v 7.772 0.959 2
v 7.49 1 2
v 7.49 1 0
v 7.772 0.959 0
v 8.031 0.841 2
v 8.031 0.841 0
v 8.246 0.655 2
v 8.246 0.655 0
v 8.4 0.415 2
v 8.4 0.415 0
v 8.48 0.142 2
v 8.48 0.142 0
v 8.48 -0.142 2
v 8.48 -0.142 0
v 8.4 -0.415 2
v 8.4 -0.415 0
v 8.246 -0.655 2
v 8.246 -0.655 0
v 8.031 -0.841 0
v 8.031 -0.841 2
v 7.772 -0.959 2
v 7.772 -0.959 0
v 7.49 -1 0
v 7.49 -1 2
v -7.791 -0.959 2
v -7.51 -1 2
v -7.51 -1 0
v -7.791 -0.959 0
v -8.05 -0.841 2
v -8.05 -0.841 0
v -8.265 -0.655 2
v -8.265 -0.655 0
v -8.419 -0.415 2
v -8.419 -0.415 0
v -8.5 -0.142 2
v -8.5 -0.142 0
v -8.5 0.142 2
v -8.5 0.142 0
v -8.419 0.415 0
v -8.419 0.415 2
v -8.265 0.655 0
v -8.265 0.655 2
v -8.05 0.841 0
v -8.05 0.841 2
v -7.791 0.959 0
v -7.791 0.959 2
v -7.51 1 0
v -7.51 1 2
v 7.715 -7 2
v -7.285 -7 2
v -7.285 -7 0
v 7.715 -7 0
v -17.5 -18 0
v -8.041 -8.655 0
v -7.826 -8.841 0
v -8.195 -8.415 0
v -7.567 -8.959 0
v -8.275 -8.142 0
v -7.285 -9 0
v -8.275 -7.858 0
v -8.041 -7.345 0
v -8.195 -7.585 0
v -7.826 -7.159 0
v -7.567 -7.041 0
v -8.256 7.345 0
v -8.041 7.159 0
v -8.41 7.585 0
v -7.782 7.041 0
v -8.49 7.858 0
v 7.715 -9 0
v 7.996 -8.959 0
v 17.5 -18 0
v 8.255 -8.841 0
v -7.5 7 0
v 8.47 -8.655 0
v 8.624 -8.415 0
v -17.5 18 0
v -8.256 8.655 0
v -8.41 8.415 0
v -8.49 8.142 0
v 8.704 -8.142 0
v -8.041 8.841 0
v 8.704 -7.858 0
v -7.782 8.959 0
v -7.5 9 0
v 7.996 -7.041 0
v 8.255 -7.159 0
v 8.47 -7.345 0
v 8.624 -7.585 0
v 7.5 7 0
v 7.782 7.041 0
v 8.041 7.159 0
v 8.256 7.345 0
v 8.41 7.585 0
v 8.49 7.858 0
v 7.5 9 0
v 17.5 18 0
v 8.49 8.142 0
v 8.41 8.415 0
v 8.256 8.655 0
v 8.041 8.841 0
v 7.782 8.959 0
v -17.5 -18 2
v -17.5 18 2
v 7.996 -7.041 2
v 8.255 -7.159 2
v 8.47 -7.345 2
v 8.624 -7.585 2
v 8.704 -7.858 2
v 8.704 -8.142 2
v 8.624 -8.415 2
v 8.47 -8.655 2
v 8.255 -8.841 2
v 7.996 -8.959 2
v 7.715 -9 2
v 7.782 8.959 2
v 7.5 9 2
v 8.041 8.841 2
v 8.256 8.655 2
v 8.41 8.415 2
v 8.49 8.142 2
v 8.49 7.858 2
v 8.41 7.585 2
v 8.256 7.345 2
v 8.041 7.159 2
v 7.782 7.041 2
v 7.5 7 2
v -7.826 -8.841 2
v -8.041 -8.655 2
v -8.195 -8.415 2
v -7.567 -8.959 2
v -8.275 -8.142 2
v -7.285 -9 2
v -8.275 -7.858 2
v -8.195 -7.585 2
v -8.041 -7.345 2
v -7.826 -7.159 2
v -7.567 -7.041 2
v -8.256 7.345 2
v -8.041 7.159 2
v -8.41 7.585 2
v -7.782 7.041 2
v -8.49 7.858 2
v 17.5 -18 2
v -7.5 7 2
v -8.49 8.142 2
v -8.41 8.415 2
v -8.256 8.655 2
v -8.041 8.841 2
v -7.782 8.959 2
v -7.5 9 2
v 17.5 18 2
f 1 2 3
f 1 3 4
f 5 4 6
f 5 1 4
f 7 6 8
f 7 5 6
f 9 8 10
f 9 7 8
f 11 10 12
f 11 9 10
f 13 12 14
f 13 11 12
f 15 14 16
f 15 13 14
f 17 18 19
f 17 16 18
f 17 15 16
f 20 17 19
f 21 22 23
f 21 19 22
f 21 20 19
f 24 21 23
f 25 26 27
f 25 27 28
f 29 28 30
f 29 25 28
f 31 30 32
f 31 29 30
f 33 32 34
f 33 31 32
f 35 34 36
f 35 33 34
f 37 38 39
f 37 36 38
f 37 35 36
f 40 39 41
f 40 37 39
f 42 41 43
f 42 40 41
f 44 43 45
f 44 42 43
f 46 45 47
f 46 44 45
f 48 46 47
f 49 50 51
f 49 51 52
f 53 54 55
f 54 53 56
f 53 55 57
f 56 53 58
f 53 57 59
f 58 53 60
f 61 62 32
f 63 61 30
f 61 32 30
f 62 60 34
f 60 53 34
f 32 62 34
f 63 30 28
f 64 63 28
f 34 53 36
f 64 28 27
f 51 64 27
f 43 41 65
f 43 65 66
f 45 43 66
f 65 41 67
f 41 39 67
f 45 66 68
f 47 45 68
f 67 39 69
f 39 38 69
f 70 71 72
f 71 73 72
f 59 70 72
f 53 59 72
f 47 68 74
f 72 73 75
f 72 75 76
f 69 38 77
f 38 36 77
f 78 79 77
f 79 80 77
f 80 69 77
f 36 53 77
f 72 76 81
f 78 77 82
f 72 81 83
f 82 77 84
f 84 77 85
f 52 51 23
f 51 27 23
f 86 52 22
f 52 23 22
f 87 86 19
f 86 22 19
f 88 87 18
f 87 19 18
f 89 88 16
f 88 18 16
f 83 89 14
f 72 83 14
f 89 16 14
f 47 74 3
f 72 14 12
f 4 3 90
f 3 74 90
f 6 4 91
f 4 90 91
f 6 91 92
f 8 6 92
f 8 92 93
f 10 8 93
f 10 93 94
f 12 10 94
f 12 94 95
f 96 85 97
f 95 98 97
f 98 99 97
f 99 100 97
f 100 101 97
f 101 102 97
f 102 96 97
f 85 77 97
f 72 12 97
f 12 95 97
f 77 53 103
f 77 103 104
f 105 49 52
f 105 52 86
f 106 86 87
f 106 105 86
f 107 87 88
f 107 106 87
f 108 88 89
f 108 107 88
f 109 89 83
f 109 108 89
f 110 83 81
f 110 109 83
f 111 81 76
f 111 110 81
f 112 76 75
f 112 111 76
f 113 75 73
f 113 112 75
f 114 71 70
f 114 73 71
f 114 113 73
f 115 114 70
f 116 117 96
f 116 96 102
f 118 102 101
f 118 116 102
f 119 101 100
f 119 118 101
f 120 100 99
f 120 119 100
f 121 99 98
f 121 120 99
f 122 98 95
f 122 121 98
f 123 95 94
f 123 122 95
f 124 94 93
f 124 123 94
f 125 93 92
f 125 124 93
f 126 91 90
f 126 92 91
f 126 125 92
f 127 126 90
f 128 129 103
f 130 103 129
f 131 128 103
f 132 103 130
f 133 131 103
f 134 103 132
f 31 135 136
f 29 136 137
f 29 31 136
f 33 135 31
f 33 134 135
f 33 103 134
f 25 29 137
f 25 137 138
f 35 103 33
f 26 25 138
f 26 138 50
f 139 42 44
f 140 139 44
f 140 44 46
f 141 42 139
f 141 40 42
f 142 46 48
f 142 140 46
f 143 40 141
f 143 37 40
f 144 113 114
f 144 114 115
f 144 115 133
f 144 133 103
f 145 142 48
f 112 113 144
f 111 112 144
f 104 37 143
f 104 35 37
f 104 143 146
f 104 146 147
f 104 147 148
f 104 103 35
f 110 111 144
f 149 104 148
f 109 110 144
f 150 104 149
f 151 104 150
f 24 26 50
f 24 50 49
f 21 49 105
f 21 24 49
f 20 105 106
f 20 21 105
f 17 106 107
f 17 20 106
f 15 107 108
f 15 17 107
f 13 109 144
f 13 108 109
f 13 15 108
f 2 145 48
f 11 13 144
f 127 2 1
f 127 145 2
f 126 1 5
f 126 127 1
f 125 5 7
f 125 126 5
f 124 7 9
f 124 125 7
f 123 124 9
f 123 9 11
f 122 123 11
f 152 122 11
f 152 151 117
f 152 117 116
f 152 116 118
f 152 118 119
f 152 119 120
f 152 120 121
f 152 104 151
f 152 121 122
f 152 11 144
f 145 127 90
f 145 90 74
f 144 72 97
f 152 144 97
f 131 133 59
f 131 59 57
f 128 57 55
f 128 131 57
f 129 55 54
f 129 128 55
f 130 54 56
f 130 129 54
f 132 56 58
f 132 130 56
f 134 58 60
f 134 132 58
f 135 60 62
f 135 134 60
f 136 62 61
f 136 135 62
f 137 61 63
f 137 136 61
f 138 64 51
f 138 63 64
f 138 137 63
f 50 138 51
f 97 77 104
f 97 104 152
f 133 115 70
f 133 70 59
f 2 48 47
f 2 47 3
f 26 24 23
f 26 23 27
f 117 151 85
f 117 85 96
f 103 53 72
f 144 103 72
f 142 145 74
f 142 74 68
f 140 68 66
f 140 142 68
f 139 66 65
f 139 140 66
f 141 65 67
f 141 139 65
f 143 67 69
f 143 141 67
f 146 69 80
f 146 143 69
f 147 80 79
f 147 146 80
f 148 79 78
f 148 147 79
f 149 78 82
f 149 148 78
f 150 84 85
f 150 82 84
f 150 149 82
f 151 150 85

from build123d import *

# Parameters (mm, degrees)
SKETCH_1_W          = 35
SKETCH_1_H          = 36
EXTRUDE_1_DEPTH     = 2
CUT_EXTRUDE_1_REACH = 27.184


with BuildPart() as part:
    # 草图1 → 凸台-拉伸1 (new body)
    with BuildSketch(Plane.XY):
        Rectangle(SKETCH_1_W, SKETCH_1_H)
    extrude(amount=EXTRUDE_1_DEPTH)

    # 草图2 → 切除-拉伸1 (cut, up to next)
    with BuildSketch(Plane.XY.offset(2), mode=Mode.PRIVATE) as cut_extrude_1_sk1:
        with BuildLine():
            Line((-7.5, 9), (7.5, 9))
            ThreePointArc((7.5, 9), (8.5, 8), (7.5, 7))
            Line((7.5, 7), (-7.5, 7))
            ThreePointArc((-7.5, 7), (-8.5, 8), (-7.5, 9))
        make_face()
    cut_extrude_1_tool1 = extrude(cut_extrude_1_sk1.sketch, amount=-CUT_EXTRUDE_1_REACH, mode=Mode.PRIVATE) & part.part
    # 草图2 → 切除-拉伸1 (cut, up to next)
    with BuildSketch(Plane.XY.offset(2), mode=Mode.PRIVATE) as cut_extrude_1_sk2:
        with BuildLine():
            Line((-7.509739979, 1), (7.490260021, 1))
            ThreePointArc((7.490260021, 1), (8.490260021, 0), (7.490260021, -1))
            Line((7.490260021, -1), (-7.509739979, -1))
            ThreePointArc((-7.509739979, -1), (-8.509739979, 0), (-7.509739979, 1))
        make_face()
    cut_extrude_1_tool2 = extrude(cut_extrude_1_sk2.sketch, amount=-CUT_EXTRUDE_1_REACH, mode=Mode.PRIVATE) & part.part
    # 草图2 → 切除-拉伸1 (cut, up to next)
    with BuildSketch(Plane.XY.offset(2), mode=Mode.PRIVATE) as cut_extrude_1_sk3:
        with BuildLine():
            Line((-7.285332316, -7), (7.714667684, -7))
            ThreePointArc((7.714667684, -7), (8.714667684, -8), (7.714667684, -9))
            Line((7.714667684, -9), (-7.285332316, -9))
            ThreePointArc((-7.285332316, -9), (-8.285332316, -8), (-7.285332316, -7))
        make_face()
    cut_extrude_1_tool3 = extrude(cut_extrude_1_sk3.sketch, amount=-CUT_EXTRUDE_1_REACH, mode=Mode.PRIVATE) & part.part
    add(cut_extrude_1_tool1.solids().sort_by_distance((0, 8, 2))[0], mode=Mode.SUBTRACT)
    add(cut_extrude_1_tool2.solids().sort_by_distance((-0.00974, 0, 2))[0], mode=Mode.SUBTRACT)
    add(cut_extrude_1_tool3.solids().sort_by_distance((0.214668, -8, 2))[0], mode=Mode.SUBTRACT)


solid = part.part
